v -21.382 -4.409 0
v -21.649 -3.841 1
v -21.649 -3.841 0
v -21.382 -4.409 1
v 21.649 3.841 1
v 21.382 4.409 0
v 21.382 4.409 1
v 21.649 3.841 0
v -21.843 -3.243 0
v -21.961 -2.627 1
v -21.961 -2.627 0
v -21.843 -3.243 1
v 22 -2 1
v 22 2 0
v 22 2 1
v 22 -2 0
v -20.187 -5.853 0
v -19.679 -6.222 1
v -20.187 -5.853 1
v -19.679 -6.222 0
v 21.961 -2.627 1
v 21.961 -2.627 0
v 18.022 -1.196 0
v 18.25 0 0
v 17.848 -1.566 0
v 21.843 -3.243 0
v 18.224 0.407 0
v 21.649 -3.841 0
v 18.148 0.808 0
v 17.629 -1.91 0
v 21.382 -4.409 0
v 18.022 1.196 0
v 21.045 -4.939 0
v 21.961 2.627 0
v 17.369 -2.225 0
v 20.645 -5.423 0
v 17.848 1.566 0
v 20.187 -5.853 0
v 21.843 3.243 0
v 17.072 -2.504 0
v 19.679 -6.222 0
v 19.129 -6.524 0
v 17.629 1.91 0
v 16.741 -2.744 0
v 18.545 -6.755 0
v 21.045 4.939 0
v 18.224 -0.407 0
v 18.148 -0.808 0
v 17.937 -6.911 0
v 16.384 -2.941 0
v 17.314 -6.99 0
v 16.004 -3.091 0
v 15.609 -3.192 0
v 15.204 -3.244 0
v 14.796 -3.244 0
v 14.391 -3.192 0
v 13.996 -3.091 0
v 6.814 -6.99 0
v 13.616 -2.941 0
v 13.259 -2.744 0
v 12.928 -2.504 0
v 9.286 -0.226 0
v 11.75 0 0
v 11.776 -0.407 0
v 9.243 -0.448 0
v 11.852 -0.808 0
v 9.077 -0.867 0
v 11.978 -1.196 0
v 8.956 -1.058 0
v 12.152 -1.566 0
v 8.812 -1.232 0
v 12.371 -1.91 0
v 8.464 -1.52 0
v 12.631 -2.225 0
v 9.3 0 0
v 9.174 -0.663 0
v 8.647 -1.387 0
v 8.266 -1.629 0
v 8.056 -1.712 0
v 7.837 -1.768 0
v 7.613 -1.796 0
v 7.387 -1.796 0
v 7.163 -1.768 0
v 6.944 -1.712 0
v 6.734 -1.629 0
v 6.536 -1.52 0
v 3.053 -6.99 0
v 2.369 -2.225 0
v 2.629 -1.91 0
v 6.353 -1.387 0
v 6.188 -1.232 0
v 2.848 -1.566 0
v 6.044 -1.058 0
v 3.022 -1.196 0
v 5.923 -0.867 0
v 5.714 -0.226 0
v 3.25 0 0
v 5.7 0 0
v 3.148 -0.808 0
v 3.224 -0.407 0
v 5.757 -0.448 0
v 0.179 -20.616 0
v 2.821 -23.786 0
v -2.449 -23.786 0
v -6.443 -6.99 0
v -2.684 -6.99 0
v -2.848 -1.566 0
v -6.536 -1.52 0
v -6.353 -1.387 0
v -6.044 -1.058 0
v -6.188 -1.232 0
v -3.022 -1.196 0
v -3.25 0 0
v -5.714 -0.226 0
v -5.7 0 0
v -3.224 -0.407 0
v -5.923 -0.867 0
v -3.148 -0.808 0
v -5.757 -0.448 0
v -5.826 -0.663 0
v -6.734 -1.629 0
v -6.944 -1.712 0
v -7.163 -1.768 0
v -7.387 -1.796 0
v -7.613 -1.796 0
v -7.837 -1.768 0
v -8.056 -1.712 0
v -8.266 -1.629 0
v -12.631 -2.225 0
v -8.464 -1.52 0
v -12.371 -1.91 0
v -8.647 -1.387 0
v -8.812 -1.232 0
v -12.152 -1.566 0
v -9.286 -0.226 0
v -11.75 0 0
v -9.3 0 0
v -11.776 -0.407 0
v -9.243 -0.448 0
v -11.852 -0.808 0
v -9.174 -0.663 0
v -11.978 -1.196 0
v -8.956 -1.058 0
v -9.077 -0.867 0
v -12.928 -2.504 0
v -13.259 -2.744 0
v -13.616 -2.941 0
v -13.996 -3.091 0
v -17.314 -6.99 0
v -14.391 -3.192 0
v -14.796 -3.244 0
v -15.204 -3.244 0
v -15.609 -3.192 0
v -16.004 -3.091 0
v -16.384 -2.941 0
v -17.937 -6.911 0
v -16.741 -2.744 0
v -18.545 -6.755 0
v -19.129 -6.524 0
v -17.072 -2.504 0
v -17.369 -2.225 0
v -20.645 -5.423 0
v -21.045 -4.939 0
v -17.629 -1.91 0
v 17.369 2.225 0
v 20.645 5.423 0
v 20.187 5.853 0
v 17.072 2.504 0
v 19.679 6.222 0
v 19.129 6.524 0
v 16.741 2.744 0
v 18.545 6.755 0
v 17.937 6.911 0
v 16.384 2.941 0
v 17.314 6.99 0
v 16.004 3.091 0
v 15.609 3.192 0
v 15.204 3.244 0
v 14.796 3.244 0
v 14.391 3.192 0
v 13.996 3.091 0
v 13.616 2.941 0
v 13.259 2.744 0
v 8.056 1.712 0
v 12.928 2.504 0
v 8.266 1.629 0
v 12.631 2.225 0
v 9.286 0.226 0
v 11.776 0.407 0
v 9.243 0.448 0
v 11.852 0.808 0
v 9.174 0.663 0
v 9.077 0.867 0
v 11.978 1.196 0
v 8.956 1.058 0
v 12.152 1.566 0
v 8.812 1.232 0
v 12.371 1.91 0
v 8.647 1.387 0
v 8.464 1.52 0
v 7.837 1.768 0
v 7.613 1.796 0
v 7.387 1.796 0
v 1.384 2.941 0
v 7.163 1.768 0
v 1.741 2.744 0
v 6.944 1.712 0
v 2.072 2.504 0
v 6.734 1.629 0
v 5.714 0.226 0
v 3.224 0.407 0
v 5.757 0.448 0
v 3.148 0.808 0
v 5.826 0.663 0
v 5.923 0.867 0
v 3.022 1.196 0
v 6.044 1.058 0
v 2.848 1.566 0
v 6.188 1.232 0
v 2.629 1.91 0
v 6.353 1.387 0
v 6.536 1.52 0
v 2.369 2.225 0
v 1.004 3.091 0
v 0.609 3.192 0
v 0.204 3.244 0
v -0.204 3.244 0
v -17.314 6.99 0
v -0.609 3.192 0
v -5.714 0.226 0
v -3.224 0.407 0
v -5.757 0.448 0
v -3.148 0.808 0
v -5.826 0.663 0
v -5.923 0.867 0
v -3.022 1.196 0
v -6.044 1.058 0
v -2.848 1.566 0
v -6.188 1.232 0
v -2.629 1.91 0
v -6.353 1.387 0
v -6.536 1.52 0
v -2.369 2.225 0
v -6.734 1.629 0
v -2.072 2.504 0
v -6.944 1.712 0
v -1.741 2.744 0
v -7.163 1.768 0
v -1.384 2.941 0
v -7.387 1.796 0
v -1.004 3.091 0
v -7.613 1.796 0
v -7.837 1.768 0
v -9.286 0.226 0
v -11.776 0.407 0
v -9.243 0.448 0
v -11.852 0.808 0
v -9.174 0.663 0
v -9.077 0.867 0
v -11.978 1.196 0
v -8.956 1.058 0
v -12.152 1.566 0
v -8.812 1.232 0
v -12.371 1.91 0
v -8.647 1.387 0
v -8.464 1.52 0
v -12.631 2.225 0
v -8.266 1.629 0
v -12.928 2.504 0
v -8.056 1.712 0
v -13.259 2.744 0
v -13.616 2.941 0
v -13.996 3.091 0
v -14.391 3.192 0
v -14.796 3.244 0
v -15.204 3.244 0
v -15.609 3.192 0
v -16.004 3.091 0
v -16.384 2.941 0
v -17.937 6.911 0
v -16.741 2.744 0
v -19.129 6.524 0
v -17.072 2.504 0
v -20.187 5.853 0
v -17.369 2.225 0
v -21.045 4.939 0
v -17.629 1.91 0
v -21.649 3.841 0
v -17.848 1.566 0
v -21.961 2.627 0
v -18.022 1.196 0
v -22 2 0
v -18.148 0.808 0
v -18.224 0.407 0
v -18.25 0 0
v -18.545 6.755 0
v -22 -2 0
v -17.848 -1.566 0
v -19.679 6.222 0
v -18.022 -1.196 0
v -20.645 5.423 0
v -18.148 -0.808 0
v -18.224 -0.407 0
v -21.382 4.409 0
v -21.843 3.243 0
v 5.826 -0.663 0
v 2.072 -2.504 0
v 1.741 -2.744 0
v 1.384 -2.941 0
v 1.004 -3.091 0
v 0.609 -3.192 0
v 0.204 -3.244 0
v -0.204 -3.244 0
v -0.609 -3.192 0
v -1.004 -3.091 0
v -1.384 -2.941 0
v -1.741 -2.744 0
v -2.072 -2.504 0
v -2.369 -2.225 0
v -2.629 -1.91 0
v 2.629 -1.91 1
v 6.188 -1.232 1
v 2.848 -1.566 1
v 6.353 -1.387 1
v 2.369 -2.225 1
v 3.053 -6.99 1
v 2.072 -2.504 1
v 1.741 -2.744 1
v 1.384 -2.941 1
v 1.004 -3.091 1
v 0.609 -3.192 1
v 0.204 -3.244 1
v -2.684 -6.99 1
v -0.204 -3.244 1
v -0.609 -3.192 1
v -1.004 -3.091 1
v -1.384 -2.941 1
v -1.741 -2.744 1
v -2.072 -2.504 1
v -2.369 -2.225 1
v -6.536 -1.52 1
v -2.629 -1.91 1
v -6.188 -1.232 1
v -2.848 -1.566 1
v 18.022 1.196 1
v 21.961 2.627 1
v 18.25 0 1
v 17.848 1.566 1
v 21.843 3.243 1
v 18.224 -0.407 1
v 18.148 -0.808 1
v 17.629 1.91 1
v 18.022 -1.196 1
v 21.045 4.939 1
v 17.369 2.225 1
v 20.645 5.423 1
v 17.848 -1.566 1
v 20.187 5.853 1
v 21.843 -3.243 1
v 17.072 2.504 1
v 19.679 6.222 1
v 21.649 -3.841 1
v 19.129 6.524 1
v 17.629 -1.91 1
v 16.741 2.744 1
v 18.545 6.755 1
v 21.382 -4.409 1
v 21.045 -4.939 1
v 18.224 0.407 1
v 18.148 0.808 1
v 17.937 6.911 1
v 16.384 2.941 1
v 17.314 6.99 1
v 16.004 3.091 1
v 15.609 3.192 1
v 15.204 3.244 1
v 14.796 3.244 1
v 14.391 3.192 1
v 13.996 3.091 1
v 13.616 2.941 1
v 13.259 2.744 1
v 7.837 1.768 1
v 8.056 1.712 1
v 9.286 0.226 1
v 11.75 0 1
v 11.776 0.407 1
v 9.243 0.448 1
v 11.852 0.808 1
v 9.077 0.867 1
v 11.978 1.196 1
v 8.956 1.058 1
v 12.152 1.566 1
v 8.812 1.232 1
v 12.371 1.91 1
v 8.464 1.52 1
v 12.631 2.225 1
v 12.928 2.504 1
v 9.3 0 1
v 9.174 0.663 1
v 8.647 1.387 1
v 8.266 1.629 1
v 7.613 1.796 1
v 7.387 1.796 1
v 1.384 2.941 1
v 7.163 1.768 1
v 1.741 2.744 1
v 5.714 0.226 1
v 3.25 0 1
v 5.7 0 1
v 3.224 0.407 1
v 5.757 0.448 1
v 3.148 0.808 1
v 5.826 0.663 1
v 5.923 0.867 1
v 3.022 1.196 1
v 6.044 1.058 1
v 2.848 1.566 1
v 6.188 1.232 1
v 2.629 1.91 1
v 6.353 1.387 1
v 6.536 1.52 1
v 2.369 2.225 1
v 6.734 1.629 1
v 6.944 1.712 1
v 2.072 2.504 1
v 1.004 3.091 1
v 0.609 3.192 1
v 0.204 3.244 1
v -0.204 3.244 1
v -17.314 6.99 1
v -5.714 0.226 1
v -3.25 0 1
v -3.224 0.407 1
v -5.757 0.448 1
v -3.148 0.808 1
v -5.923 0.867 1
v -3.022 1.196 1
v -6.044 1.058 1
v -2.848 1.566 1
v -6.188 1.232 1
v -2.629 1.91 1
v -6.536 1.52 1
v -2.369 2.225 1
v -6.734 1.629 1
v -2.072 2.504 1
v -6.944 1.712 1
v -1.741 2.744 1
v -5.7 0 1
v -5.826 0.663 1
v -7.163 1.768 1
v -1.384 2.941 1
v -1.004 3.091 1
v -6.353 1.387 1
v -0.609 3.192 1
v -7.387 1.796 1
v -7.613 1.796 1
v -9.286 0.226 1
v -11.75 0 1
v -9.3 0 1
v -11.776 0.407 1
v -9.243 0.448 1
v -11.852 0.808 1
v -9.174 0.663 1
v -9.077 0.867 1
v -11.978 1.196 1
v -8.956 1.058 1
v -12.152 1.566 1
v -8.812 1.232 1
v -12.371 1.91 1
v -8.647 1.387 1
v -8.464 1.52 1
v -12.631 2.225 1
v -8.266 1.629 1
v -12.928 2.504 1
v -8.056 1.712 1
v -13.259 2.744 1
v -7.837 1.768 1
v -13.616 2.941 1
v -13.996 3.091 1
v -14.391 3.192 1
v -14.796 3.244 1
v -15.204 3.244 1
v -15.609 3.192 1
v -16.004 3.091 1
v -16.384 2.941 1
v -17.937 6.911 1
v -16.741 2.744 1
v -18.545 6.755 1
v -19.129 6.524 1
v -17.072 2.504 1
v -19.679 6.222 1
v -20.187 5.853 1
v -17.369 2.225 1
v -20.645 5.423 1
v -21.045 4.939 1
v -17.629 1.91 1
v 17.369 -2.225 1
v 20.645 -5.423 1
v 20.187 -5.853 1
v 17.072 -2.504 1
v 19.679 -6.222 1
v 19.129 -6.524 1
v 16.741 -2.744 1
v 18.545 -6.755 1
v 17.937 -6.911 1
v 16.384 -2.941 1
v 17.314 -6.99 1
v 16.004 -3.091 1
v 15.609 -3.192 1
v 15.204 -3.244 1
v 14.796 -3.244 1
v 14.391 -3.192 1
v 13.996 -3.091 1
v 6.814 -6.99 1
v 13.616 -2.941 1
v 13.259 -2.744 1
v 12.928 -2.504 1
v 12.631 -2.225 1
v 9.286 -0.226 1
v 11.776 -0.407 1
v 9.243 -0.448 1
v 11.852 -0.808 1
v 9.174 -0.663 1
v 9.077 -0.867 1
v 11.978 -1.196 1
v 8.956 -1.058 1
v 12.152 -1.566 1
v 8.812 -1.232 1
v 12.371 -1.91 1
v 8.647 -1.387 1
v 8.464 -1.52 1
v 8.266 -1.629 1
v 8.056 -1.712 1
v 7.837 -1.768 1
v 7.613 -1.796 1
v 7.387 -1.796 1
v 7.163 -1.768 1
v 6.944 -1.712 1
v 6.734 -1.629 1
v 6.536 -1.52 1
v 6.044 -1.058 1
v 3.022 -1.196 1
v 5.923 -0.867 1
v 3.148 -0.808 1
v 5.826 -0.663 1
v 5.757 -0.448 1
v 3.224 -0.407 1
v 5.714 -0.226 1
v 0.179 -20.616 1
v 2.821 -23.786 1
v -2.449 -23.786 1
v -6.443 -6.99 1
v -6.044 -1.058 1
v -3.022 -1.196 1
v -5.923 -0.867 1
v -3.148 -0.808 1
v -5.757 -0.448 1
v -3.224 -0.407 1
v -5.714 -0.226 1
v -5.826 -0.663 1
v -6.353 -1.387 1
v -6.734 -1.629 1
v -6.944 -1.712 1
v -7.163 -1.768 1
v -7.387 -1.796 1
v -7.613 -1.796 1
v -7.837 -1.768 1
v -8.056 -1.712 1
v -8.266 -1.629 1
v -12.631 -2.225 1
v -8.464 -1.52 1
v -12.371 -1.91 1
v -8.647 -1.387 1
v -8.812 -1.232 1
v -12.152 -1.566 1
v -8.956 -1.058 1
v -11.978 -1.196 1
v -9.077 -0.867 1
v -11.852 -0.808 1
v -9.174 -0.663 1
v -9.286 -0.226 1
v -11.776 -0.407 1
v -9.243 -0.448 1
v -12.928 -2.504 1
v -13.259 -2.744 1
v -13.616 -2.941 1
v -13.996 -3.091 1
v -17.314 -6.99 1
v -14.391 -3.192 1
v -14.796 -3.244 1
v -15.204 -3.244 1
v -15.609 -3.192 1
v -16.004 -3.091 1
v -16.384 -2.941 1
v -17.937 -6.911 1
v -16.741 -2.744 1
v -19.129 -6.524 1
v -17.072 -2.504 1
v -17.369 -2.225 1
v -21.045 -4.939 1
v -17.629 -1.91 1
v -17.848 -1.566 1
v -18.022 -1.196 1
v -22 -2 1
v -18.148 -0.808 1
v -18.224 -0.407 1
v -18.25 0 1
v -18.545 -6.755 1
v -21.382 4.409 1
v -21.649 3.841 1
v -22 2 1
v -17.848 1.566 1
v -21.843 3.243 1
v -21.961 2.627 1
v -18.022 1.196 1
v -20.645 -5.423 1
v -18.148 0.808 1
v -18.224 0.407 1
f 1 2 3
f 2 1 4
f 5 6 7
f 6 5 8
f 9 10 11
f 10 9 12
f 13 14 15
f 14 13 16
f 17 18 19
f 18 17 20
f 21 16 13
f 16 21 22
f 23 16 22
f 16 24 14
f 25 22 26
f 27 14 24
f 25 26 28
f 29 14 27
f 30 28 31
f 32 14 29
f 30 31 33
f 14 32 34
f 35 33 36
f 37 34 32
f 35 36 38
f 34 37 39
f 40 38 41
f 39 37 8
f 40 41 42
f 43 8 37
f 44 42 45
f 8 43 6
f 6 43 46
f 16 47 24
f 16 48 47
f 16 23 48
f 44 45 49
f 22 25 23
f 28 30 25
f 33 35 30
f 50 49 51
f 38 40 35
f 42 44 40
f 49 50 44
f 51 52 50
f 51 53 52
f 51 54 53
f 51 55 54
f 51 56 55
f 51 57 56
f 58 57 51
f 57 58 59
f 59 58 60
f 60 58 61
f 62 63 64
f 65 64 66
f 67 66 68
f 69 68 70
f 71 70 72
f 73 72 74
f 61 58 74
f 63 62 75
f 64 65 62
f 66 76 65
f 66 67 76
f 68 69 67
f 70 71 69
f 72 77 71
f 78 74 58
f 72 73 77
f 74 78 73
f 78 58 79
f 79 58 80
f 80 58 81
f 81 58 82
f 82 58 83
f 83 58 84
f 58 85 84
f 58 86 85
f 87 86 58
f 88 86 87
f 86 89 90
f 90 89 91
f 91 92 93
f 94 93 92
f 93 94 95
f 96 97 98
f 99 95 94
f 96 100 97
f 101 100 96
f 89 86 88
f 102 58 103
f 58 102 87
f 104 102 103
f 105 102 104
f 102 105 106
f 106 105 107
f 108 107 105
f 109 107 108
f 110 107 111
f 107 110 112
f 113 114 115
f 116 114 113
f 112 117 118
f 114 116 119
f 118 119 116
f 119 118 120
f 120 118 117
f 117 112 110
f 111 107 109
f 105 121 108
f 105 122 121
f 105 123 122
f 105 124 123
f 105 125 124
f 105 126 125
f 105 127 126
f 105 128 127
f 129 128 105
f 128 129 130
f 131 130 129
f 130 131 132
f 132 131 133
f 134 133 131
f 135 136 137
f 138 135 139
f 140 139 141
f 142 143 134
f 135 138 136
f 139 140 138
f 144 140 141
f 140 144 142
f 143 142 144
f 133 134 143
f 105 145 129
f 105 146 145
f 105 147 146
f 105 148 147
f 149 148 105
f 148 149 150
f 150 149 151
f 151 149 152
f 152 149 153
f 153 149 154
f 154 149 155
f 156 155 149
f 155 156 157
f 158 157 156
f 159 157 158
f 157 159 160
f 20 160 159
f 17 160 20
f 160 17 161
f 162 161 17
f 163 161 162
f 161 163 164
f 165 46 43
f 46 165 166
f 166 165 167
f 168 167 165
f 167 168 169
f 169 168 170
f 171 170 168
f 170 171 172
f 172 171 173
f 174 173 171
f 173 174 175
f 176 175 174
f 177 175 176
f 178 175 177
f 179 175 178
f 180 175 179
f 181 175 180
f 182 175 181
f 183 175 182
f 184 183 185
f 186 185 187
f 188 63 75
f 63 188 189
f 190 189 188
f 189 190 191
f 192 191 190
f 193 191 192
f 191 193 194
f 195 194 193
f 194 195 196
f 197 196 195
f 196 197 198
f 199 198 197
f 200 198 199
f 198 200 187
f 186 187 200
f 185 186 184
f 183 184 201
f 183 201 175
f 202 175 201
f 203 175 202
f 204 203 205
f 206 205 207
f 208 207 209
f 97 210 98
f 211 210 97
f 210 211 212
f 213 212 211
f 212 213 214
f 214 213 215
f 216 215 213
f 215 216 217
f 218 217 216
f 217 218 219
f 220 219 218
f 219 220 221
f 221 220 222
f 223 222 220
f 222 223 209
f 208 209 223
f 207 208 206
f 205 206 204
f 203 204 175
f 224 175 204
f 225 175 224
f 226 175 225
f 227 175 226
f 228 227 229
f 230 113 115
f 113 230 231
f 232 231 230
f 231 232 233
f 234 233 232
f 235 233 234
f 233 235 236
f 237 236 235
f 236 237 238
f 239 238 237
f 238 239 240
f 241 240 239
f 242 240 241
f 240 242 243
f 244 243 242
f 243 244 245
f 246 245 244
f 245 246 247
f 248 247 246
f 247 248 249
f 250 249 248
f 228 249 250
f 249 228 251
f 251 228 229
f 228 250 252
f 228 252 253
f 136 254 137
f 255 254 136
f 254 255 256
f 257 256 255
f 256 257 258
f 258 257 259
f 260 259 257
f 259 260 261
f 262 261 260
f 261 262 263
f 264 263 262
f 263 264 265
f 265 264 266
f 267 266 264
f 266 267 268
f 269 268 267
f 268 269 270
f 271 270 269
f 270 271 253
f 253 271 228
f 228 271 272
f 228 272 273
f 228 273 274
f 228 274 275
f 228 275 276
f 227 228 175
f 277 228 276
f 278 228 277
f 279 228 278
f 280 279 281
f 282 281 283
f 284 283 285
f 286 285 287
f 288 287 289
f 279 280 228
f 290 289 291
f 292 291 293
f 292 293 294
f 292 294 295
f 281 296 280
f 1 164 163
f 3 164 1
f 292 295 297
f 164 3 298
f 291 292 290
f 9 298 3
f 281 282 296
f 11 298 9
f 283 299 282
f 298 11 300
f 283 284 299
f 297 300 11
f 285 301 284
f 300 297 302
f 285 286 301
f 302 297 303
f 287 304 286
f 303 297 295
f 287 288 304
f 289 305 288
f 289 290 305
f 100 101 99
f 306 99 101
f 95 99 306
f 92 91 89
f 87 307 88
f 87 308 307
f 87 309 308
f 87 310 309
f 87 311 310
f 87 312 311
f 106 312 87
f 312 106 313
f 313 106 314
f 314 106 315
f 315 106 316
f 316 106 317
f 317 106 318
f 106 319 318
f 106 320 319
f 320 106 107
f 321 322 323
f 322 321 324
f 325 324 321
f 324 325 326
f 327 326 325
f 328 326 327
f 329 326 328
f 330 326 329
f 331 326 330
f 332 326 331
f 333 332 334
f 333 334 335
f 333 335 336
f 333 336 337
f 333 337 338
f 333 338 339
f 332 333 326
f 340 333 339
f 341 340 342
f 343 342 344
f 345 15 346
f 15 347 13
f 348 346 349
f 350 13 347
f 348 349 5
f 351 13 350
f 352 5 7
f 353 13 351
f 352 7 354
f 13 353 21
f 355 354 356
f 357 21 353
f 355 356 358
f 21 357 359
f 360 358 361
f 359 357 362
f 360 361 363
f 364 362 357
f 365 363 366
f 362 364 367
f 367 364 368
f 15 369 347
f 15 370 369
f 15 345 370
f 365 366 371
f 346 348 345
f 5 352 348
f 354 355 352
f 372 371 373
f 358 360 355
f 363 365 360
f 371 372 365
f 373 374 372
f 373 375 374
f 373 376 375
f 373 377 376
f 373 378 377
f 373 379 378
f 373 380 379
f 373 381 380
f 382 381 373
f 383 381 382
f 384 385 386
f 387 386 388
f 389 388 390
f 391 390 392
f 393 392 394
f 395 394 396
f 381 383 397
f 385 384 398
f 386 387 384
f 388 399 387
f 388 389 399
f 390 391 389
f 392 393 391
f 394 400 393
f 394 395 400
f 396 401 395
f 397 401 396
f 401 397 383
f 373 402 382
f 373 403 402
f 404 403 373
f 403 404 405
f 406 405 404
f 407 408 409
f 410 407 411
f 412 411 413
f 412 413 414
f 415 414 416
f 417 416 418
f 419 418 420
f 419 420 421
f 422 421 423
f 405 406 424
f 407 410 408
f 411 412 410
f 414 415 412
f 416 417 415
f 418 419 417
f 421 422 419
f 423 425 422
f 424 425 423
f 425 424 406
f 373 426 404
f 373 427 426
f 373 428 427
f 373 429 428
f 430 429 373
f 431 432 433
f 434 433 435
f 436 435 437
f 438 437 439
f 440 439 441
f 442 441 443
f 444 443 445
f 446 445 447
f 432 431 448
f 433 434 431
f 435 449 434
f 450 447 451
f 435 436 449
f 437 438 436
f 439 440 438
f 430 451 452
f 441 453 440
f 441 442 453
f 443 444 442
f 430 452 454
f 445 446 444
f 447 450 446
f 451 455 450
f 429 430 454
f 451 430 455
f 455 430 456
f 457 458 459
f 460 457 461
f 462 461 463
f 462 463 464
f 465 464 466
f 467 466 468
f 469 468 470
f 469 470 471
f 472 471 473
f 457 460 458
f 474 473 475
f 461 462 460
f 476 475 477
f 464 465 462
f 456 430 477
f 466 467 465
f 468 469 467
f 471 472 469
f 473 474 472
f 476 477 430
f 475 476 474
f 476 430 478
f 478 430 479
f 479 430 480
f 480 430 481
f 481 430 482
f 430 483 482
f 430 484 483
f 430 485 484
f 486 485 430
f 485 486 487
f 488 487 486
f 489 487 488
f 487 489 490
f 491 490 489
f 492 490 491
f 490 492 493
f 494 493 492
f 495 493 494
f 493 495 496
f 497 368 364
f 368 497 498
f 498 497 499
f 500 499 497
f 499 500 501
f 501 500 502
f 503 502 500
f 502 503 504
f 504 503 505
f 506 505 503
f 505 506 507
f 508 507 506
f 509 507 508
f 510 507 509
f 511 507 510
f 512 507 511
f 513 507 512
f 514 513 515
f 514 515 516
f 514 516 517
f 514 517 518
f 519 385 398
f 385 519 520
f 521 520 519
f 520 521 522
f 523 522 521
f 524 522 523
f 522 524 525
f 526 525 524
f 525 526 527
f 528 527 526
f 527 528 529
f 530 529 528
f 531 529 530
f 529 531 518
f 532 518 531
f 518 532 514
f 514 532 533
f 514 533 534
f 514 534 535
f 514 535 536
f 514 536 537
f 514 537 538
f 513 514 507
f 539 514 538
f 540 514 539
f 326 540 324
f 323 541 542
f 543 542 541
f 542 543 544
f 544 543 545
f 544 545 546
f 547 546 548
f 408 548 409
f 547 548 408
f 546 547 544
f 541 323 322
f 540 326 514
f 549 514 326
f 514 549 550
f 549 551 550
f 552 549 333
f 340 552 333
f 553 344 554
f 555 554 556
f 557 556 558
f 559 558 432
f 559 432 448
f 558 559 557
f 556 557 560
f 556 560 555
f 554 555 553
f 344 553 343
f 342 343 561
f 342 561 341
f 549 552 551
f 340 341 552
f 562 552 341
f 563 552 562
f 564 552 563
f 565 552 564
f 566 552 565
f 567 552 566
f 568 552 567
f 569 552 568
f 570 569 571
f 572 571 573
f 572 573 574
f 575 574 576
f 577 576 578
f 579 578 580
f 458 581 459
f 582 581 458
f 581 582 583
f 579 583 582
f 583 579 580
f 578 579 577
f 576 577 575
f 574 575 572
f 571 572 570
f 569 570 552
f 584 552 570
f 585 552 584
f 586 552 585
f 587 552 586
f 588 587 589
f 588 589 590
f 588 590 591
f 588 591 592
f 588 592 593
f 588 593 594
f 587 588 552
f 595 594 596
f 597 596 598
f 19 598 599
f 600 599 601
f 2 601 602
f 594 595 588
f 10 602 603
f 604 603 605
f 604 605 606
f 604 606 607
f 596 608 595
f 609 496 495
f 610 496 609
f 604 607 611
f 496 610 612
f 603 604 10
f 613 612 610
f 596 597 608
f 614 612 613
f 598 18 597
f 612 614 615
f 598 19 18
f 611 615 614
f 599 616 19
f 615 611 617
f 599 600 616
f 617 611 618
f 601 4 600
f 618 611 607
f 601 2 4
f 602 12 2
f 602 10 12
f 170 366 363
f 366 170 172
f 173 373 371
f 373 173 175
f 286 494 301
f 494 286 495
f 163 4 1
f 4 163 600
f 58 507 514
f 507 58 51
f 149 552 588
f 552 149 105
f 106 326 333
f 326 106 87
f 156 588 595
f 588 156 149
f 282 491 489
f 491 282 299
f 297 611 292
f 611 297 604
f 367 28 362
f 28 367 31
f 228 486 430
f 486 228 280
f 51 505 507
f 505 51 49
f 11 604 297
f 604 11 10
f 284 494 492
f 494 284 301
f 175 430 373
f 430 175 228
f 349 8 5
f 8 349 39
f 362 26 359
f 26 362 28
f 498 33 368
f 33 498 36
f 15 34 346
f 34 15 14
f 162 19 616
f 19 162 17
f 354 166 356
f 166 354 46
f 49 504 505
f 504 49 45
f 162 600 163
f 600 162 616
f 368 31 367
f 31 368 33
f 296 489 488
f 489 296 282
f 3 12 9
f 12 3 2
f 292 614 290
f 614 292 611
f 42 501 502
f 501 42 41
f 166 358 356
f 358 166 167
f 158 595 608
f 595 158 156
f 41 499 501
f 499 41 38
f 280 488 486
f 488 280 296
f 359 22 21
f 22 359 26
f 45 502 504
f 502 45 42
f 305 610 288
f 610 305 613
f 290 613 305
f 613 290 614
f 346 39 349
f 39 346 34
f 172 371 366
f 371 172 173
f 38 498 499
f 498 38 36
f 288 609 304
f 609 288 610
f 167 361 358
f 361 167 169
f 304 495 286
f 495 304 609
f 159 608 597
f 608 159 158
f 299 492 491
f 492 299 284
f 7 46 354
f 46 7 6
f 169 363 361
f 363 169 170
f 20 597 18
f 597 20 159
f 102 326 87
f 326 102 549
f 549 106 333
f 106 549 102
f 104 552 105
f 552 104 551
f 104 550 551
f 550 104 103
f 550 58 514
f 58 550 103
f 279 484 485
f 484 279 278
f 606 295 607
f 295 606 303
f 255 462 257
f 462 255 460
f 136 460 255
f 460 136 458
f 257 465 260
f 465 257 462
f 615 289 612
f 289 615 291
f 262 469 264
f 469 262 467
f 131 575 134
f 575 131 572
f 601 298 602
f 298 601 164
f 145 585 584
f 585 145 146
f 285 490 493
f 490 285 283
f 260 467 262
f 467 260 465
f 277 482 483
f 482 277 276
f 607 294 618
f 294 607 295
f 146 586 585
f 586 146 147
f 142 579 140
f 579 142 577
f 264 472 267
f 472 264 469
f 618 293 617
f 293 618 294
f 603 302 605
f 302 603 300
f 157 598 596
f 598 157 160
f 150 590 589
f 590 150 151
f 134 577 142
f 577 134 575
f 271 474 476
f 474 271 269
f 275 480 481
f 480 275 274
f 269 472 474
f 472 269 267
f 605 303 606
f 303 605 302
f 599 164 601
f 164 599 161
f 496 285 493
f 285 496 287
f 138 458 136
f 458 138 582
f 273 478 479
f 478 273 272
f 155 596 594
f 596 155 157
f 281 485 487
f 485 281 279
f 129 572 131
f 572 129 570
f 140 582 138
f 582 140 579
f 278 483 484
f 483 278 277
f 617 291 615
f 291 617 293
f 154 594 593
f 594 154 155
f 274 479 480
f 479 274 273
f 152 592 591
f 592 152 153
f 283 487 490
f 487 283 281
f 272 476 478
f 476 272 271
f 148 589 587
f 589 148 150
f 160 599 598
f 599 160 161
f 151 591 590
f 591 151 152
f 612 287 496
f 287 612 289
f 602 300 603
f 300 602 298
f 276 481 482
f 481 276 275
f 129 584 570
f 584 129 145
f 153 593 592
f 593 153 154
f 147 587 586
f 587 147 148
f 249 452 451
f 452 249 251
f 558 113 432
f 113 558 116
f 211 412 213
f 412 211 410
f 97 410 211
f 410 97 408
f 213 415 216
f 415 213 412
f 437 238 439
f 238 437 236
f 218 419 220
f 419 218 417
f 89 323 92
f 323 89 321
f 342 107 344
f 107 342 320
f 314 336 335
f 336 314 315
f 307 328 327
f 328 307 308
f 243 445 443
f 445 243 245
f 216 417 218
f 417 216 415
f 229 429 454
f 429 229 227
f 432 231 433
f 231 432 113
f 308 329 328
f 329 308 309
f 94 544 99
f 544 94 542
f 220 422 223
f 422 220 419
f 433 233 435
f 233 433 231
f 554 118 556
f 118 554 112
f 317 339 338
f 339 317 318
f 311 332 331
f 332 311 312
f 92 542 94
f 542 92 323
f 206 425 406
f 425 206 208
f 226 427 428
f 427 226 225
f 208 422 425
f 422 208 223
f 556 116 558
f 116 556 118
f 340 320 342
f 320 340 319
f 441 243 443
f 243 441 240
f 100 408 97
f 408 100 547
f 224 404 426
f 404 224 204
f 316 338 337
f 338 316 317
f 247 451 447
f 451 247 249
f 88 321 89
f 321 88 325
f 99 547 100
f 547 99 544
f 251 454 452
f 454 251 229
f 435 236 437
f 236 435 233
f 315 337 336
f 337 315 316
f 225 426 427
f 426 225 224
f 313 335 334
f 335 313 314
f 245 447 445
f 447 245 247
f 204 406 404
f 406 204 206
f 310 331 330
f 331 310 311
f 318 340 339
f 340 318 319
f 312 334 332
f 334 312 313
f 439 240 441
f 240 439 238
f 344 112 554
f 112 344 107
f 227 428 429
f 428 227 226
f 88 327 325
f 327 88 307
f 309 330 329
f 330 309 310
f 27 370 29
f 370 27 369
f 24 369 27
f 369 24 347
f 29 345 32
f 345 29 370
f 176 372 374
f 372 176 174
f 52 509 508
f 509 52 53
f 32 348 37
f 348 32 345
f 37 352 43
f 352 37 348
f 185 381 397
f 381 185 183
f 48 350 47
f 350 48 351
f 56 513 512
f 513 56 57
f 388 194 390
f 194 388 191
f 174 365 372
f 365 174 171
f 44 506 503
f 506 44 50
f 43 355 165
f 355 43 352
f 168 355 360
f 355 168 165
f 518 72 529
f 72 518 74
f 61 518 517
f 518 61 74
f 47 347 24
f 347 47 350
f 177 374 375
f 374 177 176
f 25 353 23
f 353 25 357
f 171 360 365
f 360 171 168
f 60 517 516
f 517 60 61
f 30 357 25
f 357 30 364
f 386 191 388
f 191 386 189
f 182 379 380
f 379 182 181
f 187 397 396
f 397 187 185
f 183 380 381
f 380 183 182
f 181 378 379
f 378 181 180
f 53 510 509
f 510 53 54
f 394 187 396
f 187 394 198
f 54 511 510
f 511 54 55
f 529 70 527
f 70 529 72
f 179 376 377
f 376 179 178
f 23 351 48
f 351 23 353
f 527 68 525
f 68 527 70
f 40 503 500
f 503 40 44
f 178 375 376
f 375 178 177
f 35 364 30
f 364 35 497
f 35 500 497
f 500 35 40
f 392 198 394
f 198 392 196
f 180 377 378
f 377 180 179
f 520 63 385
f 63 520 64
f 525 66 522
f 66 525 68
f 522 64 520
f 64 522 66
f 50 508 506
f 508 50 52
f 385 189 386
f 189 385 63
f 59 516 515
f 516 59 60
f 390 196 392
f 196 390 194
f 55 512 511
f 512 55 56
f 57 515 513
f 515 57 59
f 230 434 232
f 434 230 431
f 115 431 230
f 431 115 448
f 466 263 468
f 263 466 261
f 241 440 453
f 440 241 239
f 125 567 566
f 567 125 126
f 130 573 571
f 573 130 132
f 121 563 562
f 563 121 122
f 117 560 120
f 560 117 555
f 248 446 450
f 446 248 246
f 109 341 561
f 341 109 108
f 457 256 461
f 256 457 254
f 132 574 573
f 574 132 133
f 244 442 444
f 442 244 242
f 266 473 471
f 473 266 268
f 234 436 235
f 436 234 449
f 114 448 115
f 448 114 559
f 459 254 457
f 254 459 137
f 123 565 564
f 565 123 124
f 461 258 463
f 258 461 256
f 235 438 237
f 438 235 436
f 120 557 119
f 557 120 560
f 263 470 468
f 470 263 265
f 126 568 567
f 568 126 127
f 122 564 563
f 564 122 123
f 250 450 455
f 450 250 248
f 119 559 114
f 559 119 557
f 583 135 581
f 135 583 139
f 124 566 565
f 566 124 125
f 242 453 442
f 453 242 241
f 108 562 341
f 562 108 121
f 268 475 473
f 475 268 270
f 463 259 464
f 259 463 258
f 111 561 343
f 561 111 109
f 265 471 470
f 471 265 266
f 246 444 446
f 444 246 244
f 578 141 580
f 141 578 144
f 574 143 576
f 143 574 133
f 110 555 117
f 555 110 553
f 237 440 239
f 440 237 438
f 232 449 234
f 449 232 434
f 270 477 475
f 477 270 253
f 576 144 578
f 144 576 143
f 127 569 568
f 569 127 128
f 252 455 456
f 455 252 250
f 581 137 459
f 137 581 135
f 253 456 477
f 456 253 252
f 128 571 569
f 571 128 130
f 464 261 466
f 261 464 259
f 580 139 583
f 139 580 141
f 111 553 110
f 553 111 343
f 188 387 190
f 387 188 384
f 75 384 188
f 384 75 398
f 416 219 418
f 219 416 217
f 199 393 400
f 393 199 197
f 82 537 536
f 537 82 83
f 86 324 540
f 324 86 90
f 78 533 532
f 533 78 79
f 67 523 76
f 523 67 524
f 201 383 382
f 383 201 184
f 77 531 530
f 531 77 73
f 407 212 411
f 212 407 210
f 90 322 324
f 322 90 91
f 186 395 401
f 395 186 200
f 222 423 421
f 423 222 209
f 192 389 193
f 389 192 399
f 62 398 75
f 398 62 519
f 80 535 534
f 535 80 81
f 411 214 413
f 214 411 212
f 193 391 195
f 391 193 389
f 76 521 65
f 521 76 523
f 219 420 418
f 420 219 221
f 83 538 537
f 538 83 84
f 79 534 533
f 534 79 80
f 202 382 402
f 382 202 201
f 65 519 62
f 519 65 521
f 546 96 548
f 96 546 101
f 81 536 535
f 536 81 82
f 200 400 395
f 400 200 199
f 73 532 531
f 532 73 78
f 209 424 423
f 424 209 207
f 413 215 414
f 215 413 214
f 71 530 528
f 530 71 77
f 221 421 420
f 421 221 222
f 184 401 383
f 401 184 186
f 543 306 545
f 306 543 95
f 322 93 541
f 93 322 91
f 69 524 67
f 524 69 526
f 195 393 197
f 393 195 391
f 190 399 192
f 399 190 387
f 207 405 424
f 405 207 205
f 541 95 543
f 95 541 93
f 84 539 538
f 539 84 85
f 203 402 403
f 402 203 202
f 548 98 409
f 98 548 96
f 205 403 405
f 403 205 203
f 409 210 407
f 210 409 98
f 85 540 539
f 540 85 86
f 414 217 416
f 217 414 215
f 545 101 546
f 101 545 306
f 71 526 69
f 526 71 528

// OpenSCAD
$fn = 50;


difference() {
	union() {
		*color(alpha = 1.0000000000, c = "gray") {
			translate(v = [0, 14, 0]) {
				linear_extrude(height = 1) {
					text(font = "Arial:style=Bold", halign = "center", size = 4.5000000000, text = "COMMENT description oobb_plate_shape_p_type_1_depth_3_width_1_thickness_v_extra_oobb_size", valign = "center");
				}
			}
		}
		hull() {
			translate(v = [-17.0000000000, 2.0000000000, 0]) {
				cylinder(h = 1, r = 5);
			}
			translate(v = [17.0000000000, 2.0000000000, 0]) {
				cylinder(h = 1, r = 5);
			}
			translate(v = [-17.0000000000, -2.0000000000, 0]) {
				cylinder(h = 1, r = 5);
			}
			translate(v = [17.0000000000, -2.0000000000, 0]) {
				cylinder(h = 1, r = 5);
			}
		}
		translate(v = [0, -5, 0]) {
			linear_extrude(height = 1) {
				text(font = "DejaVu Sans Mono:style=Bold", halign = "center", size = 19.0000000000, text = "V", valign = "top");
			}
		}
	}
	union() {
		*color(alpha = 1.0000000000, c = "gray") {
			translate(v = [0, 14, 0]) {
				linear_extrude(height = 1) {
					text(font = "Arial:style=Bold", halign = "center", size = 4.5000000000, text = "COMMENT description oobb_holes_shape_n_type_3_width_1_thickness_v_extra_oobb_size_1_height_'all'_holes_true_both_holes", valign = "center");
				}
			}
		}
		translate(v = [-15.0000000000, 0.0000000000, 0]) {
			translate(v = [0, 0, -50]) {
				cylinder(h = 100, r = 3.2500000000);
			}
		}
		translate(v = [0, 0, -50]) {
			cylinder(h = 100, r = 3.2500000000);
		}
		translate(v = [15.0000000000, 0.0000000000, 0]) {
			translate(v = [0, 0, -50]) {
				cylinder(h = 100, r = 3.2500000000);
			}
		}
		translate(v = [-15.0000000000, 0.0000000000, 0]) {
			translate(v = [0, 0, -50]) {
				cylinder(h = 100, r = 1.8000000000);
			}
		}
		translate(v = [-7.5000000000, 0.0000000000, 0]) {
			translate(v = [0, 0, -50]) {
				cylinder(h = 100, r = 1.8000000000);
			}
		}
		translate(v = [0, 0, -50]) {
			cylinder(h = 100, r = 1.8000000000);
		}
		translate(v = [7.5000000000, 0.0000000000, 0]) {
			translate(v = [0, 0, -50]) {
				cylinder(h = 100, r = 1.8000000000);
			}
		}
		translate(v = [15.0000000000, 0.0000000000, 0]) {
			translate(v = [0, 0, -50]) {
				cylinder(h = 100, r = 1.8000000000);
			}
		}
	}
}
